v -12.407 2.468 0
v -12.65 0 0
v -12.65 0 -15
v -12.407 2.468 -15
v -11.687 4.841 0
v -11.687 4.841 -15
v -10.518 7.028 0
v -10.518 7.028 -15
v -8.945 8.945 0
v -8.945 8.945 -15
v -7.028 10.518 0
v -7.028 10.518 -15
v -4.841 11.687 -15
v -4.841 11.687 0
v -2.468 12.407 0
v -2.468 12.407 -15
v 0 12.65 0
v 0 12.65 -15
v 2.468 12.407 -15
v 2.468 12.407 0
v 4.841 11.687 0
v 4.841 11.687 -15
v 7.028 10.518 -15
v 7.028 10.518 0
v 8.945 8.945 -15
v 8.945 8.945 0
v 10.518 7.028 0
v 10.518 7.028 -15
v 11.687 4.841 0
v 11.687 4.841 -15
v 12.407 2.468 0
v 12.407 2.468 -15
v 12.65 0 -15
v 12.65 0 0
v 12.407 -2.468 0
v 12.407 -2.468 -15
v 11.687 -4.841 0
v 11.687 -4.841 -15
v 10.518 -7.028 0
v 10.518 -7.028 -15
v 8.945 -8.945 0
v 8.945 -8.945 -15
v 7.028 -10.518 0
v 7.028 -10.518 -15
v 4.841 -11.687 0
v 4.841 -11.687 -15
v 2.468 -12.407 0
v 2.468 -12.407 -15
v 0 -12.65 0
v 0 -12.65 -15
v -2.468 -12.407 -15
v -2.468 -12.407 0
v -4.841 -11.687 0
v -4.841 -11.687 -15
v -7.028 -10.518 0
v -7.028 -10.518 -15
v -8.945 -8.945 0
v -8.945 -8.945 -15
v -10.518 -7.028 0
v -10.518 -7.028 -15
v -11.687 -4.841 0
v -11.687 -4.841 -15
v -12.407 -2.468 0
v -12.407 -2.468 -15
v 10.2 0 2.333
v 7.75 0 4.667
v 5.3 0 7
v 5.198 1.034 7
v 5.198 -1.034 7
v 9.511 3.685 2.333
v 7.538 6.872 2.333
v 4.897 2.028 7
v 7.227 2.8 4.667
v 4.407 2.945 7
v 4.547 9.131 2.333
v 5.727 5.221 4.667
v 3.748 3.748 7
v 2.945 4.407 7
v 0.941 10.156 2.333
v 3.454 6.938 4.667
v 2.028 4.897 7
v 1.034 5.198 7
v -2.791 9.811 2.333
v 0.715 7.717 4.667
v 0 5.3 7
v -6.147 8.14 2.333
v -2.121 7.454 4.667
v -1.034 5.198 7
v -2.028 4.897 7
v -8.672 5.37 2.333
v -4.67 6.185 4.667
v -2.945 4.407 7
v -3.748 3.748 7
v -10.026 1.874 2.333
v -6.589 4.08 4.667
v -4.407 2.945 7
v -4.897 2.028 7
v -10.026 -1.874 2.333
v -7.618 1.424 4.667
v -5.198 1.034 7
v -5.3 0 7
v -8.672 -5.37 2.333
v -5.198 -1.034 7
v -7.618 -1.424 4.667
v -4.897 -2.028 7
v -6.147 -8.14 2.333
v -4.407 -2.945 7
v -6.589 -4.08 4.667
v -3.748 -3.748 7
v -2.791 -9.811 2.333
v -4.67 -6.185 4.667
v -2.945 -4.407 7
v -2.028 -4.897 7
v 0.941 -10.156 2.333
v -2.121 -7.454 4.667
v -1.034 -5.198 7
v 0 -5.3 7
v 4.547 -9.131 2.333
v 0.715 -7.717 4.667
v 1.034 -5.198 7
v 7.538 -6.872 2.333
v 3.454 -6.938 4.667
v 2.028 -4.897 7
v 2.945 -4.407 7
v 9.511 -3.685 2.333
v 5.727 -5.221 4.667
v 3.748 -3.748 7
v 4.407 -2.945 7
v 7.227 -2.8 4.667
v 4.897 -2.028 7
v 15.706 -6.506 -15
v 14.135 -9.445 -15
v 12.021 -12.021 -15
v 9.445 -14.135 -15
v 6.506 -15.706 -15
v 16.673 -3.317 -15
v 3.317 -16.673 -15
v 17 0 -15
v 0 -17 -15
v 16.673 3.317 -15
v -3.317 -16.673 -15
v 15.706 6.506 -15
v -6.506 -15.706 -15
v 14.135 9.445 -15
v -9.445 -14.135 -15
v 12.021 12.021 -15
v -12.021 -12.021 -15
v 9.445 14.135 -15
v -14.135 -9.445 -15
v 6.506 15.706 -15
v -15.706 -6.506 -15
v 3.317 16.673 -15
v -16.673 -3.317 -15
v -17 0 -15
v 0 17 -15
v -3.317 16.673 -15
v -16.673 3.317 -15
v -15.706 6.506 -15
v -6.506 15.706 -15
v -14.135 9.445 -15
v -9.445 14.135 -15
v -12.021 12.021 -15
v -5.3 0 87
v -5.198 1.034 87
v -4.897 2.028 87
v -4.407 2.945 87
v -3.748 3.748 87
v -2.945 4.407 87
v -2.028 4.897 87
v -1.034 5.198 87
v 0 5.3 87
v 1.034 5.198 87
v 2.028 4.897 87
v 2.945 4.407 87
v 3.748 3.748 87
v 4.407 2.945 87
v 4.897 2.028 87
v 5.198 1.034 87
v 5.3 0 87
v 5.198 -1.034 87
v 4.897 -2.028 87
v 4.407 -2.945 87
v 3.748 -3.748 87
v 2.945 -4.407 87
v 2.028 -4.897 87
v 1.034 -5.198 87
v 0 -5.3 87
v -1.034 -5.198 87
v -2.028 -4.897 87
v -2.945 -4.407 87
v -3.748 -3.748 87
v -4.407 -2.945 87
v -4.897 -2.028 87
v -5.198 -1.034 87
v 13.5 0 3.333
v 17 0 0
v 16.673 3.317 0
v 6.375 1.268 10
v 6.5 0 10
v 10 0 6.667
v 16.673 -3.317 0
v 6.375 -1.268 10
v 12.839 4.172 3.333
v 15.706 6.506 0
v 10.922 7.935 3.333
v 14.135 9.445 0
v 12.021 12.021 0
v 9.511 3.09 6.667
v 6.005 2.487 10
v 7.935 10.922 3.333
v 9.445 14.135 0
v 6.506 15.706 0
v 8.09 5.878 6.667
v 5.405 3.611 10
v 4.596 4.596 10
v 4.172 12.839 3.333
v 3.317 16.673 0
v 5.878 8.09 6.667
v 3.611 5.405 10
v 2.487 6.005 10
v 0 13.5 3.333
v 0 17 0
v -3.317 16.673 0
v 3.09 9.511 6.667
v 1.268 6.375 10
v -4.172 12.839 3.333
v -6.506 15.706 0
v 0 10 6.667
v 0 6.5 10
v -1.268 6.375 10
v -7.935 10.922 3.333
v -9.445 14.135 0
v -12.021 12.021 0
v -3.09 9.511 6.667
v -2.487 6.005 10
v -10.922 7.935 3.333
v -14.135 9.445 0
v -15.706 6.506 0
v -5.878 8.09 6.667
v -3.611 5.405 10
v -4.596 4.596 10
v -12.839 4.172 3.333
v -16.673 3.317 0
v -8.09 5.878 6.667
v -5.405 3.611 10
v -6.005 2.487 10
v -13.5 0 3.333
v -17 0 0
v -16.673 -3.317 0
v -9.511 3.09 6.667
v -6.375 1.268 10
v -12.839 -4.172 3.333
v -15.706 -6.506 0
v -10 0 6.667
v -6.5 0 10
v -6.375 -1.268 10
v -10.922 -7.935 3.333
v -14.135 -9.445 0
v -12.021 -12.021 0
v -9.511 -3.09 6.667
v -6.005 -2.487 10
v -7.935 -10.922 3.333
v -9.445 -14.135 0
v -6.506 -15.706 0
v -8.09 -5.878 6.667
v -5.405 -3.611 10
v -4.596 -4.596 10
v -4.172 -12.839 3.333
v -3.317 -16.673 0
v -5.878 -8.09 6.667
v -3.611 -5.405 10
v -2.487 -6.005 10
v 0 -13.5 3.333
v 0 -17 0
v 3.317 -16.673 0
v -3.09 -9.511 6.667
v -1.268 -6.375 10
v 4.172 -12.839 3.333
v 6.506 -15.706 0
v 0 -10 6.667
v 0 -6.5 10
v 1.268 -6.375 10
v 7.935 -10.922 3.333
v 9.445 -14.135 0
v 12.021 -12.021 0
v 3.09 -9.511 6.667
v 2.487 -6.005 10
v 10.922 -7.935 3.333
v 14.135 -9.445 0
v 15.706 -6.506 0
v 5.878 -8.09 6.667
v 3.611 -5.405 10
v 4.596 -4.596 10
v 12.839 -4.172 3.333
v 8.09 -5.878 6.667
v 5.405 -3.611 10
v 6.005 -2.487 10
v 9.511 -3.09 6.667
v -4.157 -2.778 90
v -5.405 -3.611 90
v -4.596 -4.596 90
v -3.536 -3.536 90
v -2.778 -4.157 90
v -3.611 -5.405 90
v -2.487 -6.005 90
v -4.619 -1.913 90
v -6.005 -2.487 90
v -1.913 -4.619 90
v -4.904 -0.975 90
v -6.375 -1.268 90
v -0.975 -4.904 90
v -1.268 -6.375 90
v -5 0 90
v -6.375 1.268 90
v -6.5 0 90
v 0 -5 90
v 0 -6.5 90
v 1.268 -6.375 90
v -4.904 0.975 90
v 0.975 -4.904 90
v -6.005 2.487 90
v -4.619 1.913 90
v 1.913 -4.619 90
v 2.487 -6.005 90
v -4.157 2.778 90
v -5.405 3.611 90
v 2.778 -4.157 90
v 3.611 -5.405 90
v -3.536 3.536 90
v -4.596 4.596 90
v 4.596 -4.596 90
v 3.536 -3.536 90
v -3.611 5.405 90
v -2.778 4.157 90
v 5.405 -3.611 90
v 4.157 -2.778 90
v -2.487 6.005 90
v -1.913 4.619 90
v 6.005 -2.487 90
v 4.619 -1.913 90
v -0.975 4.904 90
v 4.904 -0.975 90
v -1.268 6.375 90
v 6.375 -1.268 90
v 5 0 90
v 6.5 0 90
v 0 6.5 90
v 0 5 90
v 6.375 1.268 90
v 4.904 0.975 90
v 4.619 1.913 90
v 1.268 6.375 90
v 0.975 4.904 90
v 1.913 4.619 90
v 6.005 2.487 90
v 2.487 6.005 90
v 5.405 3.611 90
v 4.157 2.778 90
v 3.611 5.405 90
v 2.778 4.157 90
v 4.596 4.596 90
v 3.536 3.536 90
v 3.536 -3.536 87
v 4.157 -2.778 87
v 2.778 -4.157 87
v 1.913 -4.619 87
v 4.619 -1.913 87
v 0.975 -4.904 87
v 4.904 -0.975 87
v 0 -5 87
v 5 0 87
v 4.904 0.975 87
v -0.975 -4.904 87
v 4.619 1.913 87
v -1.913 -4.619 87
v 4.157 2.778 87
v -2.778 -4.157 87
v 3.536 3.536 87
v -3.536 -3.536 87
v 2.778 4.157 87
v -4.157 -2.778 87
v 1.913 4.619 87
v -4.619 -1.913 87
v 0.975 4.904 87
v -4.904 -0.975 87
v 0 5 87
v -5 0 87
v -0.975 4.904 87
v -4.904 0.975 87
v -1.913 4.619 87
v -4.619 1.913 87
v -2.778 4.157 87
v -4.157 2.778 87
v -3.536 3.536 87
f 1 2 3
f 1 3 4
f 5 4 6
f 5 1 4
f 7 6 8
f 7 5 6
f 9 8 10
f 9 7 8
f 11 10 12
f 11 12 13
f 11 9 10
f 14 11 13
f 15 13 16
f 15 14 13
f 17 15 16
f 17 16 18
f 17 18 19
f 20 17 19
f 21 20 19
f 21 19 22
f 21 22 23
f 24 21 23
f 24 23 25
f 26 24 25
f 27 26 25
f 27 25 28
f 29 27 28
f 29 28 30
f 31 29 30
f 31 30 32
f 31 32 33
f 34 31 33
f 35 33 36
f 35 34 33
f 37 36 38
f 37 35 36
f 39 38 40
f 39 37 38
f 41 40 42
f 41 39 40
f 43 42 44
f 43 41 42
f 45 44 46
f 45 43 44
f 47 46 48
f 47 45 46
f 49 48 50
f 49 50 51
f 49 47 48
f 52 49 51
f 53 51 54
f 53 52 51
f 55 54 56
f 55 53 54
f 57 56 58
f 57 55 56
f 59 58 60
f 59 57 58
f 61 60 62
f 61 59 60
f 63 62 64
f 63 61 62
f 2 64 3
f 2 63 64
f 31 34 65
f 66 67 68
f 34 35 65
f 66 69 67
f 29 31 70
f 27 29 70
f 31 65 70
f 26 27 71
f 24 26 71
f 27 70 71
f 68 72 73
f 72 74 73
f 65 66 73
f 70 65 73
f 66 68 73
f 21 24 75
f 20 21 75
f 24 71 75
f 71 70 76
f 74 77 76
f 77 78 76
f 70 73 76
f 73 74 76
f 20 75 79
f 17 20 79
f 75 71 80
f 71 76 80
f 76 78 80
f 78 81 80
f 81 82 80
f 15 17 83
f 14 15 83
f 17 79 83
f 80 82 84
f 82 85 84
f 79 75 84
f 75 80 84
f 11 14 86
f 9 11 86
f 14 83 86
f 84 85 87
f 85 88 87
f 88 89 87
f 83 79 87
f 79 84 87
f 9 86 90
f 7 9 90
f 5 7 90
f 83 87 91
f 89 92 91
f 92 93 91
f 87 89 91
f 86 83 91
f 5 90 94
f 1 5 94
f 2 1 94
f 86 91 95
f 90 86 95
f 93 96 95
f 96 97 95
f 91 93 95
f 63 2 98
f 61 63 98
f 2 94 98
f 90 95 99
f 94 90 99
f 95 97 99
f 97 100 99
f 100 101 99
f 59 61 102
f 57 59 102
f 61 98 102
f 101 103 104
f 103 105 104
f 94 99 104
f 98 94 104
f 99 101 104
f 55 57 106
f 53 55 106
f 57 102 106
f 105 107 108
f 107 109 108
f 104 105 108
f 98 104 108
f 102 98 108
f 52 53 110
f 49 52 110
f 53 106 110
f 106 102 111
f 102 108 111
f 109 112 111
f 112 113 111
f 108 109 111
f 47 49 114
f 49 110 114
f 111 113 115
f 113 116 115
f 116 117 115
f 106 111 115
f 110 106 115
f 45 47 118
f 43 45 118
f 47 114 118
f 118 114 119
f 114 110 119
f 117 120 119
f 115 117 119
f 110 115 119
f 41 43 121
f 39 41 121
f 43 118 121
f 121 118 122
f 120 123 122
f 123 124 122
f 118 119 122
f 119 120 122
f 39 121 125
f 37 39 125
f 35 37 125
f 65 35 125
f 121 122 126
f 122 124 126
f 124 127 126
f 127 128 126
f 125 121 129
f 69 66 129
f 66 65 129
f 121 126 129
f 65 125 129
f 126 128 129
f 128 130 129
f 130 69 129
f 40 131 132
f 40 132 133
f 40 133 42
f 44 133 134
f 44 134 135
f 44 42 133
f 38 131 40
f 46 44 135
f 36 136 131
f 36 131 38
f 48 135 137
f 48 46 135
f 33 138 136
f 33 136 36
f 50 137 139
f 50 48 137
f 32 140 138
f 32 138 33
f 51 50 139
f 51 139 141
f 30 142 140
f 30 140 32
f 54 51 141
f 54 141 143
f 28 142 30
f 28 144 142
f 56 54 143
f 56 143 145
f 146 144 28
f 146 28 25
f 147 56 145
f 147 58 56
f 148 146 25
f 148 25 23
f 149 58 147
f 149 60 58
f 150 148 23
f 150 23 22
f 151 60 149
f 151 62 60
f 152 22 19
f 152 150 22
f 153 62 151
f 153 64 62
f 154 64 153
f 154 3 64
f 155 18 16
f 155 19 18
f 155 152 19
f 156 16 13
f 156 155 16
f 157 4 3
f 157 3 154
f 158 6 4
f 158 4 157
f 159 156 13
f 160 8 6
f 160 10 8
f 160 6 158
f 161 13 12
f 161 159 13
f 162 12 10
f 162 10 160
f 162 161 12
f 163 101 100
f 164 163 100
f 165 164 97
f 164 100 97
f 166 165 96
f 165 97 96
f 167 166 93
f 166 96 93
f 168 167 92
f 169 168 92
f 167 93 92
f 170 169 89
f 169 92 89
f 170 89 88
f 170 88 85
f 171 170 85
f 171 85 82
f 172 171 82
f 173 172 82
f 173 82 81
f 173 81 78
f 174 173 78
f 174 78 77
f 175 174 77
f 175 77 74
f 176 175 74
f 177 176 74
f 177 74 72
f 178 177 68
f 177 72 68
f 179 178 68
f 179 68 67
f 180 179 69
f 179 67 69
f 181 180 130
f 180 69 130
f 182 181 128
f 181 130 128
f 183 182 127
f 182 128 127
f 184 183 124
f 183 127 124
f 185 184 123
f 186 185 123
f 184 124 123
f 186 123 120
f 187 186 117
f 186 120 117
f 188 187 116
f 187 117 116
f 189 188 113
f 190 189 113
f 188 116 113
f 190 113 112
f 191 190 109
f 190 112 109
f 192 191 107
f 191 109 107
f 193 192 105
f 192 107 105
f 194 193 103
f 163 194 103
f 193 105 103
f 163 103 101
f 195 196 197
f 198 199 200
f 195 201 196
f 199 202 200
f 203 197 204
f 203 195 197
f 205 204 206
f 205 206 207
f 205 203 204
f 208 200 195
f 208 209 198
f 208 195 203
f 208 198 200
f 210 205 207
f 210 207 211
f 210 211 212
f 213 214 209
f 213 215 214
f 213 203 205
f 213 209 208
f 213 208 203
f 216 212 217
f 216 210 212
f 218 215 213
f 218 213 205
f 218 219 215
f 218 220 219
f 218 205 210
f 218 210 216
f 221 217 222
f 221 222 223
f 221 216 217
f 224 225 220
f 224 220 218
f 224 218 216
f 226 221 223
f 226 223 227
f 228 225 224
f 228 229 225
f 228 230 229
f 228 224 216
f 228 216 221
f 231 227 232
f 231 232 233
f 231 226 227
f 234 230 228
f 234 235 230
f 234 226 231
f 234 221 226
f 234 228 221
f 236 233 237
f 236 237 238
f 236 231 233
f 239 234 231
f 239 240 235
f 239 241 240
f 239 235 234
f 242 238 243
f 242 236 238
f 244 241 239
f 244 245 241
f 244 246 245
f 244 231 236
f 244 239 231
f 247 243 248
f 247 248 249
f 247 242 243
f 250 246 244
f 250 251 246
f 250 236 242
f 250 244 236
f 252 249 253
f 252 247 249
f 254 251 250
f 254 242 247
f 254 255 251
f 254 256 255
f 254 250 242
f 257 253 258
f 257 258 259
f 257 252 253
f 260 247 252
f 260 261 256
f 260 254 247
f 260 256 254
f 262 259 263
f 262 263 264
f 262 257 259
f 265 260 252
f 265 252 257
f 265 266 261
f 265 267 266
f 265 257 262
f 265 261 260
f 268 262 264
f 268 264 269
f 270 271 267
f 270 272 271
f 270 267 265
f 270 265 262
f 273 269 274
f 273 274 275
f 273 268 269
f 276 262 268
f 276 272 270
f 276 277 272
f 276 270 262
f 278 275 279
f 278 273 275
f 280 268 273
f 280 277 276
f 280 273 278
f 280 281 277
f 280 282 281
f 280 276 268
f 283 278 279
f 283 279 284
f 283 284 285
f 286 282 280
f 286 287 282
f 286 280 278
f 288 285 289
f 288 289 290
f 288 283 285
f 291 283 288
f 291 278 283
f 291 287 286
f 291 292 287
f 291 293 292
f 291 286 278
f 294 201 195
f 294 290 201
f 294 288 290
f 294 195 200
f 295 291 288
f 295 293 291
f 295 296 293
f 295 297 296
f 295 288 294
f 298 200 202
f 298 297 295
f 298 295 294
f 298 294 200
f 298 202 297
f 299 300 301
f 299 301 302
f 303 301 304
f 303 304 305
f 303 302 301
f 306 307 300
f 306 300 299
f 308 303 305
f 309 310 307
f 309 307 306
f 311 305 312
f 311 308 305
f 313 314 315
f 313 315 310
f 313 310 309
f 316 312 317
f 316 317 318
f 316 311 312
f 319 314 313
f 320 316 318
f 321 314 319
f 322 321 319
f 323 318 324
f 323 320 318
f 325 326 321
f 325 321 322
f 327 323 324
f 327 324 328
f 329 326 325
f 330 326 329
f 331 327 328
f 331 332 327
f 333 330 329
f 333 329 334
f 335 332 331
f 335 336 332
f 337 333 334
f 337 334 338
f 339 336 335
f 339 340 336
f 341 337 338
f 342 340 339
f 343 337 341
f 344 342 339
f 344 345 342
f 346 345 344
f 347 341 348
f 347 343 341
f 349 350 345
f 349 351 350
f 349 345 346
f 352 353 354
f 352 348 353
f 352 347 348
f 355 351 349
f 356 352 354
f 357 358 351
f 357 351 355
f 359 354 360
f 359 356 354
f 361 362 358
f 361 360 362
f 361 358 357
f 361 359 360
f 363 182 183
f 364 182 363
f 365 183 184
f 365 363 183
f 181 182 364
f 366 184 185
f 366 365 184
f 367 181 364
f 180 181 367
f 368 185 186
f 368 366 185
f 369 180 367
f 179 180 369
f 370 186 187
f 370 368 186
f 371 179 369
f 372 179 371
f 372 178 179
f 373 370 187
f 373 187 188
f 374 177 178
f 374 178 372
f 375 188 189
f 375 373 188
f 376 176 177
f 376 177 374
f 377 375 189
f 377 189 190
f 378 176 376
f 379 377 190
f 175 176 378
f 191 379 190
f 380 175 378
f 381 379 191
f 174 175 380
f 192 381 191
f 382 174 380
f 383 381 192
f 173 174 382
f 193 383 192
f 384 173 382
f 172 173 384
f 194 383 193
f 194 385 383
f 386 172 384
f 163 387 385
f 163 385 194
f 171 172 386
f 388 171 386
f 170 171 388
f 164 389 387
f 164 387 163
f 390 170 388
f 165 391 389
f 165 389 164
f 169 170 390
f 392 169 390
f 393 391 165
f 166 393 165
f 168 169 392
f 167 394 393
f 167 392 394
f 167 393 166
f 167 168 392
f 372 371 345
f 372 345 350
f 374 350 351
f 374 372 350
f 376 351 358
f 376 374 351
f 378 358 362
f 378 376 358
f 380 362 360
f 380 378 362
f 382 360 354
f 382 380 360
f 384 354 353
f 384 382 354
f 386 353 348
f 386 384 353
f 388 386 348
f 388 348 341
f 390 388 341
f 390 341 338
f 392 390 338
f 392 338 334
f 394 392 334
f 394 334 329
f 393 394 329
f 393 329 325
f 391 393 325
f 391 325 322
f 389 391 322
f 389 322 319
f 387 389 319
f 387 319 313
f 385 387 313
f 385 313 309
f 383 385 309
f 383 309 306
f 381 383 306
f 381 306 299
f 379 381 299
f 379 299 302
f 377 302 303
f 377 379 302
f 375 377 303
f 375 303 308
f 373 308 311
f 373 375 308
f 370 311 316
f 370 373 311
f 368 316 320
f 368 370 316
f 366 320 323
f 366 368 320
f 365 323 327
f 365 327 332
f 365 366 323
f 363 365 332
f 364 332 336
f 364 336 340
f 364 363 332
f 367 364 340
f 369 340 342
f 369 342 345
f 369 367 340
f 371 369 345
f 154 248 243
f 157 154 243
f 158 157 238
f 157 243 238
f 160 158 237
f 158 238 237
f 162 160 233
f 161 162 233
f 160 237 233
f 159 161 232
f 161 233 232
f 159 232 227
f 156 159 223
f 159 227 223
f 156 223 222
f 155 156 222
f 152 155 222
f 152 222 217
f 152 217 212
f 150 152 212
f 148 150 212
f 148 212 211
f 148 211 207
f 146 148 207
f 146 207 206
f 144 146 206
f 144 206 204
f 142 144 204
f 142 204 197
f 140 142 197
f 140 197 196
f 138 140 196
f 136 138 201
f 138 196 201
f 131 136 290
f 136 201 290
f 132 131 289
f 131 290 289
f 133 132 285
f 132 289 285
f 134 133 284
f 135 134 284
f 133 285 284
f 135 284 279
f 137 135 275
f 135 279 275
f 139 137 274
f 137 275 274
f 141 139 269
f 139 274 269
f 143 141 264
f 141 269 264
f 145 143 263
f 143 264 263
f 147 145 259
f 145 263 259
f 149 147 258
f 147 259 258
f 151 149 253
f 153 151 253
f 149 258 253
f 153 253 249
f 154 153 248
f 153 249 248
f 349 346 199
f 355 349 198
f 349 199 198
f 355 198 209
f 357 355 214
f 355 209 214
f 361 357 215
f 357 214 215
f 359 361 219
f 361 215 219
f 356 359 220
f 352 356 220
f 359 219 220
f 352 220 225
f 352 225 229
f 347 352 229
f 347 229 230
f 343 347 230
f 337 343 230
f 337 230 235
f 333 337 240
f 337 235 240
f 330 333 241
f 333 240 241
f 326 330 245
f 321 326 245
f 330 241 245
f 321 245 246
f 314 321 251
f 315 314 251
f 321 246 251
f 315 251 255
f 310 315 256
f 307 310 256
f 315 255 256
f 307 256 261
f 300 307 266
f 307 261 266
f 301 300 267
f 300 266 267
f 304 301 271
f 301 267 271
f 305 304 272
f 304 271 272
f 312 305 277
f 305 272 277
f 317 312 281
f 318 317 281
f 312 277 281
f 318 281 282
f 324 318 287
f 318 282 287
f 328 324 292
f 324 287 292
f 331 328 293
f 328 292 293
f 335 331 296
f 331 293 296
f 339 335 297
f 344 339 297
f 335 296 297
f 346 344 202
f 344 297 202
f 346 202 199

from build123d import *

# Parameters (mm, degrees)
SKETCH1_R           = 17
SKETCH2_R           = 6.5
SKETCH3_R           = 6.5
SKETCH3_R_2         = 5
BOSS_EXTRUDE1_DEPTH = 80
SHELL1_T            = -3
SKETCH4_R           = 5.3
CUT_EXTRUDE1_DEPTH  = 80
SKETCH5_R           = 17
SKETCH5_R_2         = 12.65
BOSS_EXTRUDE2_DEPTH = 15


with BuildPart() as part:
    # Sketch1 → Loft1 section 0
    with BuildSketch(Plane.XY):
        Circle(SKETCH1_R)
    # Sketch2 → Loft1 section 1
    with BuildSketch(Plane.XY.offset(10)):
        Circle(SKETCH2_R)
    loft()

    # Sketch3 → Boss-Extrude1 (add)
    with BuildSketch(Plane.XY.offset(10)):
        Circle(SKETCH3_R)
        Circle(SKETCH3_R_2, mode=Mode.SUBTRACT)
    extrude(amount=BOSS_EXTRUDE1_DEPTH)

    # Shell1
    shell1_openings = [part.faces().sort_by_distance(p)[0] for p in [
        (0, 0, 0),
    ]]
    offset(amount=SHELL1_T, openings=shell1_openings, kind=Kind.INTERSECTION)

    # Sketch4 → Cut-Extrude1 (cut)
    with BuildSketch(Plane(origin=(0, 0, 7), x_dir=(-1, 0, 0), z_dir=(0, 0, -1))):
        Circle(SKETCH4_R)
    extrude(amount=-CUT_EXTRUDE1_DEPTH, mode=Mode.SUBTRACT)

    # Sketch5 → Boss-Extrude2 (add)
    with BuildSketch(Plane(origin=(0, 0, 0), x_dir=(-1, 0, 0), z_dir=(0, 0, -1))):
        Circle(SKETCH5_R)
        Circle(SKETCH5_R_2, mode=Mode.SUBTRACT)
    extrude(amount=BOSS_EXTRUDE2_DEPTH)


solid = part.part
